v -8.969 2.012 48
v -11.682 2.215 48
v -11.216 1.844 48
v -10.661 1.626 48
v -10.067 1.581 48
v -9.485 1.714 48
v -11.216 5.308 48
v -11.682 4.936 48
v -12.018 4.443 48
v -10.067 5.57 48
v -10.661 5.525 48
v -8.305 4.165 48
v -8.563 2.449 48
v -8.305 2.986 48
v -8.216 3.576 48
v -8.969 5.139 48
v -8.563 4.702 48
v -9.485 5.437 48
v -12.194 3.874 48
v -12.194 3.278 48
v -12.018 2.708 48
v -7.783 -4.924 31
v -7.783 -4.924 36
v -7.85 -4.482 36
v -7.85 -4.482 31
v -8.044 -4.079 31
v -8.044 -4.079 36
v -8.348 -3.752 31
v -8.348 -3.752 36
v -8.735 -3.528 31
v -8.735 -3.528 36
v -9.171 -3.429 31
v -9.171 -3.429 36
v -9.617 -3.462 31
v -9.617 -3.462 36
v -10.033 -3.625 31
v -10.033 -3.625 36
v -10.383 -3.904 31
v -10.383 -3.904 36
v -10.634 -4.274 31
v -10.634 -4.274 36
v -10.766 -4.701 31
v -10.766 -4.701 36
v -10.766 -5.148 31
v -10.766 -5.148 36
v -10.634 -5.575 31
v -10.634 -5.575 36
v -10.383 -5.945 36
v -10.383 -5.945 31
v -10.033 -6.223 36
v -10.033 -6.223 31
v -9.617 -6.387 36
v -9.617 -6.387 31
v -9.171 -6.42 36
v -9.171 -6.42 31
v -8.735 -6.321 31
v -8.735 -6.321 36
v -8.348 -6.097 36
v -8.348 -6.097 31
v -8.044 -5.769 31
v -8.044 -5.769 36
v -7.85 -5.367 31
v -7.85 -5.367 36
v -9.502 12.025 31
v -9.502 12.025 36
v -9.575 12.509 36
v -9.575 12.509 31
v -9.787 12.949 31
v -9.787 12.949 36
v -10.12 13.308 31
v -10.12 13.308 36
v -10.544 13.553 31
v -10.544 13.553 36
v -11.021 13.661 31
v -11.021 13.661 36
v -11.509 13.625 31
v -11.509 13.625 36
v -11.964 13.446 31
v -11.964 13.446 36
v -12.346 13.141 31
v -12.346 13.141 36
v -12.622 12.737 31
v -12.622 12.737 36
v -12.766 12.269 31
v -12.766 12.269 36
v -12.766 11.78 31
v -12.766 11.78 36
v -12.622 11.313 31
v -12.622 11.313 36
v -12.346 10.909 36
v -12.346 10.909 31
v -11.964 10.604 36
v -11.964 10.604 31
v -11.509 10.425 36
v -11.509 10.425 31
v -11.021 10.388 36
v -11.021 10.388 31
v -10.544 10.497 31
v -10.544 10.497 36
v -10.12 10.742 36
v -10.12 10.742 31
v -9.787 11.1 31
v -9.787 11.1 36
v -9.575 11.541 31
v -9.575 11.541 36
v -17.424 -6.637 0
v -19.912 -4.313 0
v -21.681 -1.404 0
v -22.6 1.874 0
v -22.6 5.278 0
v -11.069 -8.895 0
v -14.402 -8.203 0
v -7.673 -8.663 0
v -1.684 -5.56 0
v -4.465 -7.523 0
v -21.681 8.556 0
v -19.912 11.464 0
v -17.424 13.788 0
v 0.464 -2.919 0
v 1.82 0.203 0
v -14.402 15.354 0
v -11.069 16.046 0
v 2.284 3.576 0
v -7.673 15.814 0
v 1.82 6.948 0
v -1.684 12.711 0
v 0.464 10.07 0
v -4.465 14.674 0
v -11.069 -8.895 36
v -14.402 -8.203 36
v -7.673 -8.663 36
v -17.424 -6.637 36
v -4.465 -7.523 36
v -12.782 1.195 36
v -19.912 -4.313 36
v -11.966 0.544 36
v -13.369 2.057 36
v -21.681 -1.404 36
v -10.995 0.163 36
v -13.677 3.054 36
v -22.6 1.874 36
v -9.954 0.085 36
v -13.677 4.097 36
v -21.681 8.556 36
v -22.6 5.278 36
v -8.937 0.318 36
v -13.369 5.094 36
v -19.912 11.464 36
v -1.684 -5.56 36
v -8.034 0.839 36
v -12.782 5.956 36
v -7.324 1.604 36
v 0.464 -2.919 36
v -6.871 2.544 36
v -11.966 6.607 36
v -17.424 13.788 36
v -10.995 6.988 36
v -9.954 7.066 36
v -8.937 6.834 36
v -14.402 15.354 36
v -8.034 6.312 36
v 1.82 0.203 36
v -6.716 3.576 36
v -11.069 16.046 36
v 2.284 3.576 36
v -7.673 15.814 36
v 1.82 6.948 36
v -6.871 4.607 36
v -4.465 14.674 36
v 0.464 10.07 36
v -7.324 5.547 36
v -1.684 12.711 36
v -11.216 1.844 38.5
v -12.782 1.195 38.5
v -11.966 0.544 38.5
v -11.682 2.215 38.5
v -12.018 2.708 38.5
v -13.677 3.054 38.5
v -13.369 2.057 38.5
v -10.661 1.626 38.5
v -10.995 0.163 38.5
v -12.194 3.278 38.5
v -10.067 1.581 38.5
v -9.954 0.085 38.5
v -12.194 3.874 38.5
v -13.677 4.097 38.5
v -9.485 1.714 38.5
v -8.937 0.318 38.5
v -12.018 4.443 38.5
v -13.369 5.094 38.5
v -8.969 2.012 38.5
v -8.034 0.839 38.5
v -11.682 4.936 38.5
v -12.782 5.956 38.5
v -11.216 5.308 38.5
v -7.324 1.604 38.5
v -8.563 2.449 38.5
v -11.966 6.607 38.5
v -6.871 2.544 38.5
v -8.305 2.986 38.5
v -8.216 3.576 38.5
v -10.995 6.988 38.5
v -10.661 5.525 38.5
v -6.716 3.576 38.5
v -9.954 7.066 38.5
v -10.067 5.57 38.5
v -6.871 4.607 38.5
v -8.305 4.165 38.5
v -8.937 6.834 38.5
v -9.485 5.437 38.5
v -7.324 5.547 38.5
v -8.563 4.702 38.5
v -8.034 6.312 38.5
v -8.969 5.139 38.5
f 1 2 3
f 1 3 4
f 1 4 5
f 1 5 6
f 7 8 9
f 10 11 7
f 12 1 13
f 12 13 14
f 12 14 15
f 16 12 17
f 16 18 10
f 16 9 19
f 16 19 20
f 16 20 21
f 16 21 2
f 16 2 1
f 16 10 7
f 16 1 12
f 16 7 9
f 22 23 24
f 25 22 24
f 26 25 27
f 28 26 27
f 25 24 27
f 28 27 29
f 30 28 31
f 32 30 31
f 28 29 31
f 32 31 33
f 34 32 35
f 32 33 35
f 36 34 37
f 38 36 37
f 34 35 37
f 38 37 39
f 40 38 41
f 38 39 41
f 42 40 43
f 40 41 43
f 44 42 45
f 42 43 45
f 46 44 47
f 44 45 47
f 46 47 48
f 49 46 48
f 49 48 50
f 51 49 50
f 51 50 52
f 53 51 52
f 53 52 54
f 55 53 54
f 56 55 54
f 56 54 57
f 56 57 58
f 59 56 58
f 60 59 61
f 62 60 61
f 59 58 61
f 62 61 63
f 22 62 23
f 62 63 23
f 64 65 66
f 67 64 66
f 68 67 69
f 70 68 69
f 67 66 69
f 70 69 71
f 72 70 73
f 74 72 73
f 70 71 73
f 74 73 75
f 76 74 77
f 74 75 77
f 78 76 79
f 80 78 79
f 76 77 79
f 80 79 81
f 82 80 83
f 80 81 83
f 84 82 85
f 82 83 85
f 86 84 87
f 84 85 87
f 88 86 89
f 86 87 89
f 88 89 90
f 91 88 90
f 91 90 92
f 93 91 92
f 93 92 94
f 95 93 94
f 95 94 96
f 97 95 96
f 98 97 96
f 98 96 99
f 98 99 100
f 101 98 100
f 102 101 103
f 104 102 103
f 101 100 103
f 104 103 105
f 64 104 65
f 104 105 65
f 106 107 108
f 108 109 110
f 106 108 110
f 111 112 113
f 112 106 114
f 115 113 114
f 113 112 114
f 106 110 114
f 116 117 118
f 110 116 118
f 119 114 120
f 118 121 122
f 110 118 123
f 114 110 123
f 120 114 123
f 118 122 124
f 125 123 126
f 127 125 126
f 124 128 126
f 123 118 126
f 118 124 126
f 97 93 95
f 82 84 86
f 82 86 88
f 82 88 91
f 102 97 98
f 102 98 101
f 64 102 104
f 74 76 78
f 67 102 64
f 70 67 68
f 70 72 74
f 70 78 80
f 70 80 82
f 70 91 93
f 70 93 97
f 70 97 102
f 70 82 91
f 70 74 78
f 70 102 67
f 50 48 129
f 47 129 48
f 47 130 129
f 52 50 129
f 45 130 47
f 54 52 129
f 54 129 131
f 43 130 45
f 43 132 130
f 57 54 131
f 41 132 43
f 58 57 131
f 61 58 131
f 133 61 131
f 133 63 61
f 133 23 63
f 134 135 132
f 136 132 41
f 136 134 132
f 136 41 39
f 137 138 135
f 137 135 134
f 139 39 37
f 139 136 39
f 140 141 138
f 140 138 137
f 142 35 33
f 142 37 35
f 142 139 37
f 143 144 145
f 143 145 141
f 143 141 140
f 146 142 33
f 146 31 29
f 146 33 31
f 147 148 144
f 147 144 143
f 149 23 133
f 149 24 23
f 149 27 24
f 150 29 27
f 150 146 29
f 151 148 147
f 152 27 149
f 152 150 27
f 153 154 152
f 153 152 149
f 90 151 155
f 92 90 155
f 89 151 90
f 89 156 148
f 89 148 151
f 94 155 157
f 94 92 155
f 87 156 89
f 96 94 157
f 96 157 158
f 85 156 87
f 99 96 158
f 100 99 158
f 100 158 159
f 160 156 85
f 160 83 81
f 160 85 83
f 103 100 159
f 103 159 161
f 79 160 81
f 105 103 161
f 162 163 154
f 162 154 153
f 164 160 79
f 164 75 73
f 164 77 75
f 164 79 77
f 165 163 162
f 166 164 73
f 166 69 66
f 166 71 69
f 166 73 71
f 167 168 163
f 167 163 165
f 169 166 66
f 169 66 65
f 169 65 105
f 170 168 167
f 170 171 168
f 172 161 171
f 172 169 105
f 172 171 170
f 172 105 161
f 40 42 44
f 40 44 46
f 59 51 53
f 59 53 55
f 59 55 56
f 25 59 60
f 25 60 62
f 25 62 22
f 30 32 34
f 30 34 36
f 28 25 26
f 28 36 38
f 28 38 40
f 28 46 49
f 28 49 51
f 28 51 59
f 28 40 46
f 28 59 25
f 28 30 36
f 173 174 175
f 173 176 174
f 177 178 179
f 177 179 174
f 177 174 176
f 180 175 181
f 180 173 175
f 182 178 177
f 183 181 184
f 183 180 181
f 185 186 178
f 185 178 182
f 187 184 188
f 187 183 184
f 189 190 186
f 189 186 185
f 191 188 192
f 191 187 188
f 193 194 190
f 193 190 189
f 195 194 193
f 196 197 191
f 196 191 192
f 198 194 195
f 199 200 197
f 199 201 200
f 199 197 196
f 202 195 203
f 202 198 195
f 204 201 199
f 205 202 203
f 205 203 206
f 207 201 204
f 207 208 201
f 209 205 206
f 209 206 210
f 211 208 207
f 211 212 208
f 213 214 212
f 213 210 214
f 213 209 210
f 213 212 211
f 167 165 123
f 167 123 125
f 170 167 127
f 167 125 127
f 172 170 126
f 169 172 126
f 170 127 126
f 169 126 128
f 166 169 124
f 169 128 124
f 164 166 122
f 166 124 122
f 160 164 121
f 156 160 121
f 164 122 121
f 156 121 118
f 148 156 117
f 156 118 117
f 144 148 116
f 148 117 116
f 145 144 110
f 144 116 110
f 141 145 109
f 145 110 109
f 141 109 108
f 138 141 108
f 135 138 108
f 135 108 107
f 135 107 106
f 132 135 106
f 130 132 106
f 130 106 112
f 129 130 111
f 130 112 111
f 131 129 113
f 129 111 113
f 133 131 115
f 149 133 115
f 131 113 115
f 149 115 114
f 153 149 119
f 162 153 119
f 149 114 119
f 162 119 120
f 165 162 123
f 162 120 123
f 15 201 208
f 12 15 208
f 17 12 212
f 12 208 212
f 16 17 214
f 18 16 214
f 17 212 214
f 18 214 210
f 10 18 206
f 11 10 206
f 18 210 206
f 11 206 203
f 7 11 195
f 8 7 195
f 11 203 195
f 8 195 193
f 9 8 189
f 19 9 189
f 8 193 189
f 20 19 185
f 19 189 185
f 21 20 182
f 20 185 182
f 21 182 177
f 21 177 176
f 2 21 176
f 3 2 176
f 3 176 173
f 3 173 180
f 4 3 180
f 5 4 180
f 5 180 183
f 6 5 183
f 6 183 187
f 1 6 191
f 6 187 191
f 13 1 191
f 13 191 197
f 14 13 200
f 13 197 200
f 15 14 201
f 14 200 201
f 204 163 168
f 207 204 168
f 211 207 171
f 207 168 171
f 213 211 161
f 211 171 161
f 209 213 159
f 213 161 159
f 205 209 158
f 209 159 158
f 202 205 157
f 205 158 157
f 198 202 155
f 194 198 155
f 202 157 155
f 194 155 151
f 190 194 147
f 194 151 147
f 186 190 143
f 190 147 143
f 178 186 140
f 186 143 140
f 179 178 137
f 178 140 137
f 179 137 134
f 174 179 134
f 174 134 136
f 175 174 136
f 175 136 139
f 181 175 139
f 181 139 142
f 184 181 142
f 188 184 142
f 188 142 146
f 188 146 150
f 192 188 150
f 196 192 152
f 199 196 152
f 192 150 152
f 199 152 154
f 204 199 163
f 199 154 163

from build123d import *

# Parameters (mm, degrees)
SKETCH1_R           = 12.5
BOSS_EXTRUDE1_DEPTH = 36
SKETCH2_R           = 3.5
BOSS_EXTRUDE2_DEPTH = 2.5
SKETCH3_R           = 2
BOSS_EXTRUDE3_DEPTH = 9.5
SKETCH4_R           = 1.641182994
SKETCH4_R_2         = 1.5
CUT_EXTRUDE1_DEPTH  = 5


with BuildPart() as part:
    # Sketch1 → Boss-Extrude1 (new body)
    with BuildSketch(Plane.XY):
        with Locations((-10.215967641, 3.575588675)):
            Circle(SKETCH1_R)
    extrude(amount=BOSS_EXTRUDE1_DEPTH)

    # Sketch2 → Boss-Extrude2 (add)
    with BuildSketch(Plane.XY.offset(36)):
        with Locations((-10.215967641, 3.575588675)):
            Circle(SKETCH2_R)
    extrude(amount=BOSS_EXTRUDE2_DEPTH)

    # Sketch3 → Boss-Extrude3 (add)
    with BuildSketch(Plane.XY.offset(38.5)):
        with Locations((-10.215967641, 3.575588675)):
            Circle(SKETCH3_R)
    extrude(amount=BOSS_EXTRUDE3_DEPTH)

    # Sketch4 → Cut-Extrude1 (cut)
    with BuildSketch(Plane.XY.offset(36)):
        with Locations((-11.143331912, 12.024848731)):
            Circle(SKETCH4_R)
        with Locations((-9.283034314, -4.924411325)):
            Circle(SKETCH4_R_2)
    extrude(amount=-CUT_EXTRUDE1_DEPTH, mode=Mode.SUBTRACT)


solid = part.part
